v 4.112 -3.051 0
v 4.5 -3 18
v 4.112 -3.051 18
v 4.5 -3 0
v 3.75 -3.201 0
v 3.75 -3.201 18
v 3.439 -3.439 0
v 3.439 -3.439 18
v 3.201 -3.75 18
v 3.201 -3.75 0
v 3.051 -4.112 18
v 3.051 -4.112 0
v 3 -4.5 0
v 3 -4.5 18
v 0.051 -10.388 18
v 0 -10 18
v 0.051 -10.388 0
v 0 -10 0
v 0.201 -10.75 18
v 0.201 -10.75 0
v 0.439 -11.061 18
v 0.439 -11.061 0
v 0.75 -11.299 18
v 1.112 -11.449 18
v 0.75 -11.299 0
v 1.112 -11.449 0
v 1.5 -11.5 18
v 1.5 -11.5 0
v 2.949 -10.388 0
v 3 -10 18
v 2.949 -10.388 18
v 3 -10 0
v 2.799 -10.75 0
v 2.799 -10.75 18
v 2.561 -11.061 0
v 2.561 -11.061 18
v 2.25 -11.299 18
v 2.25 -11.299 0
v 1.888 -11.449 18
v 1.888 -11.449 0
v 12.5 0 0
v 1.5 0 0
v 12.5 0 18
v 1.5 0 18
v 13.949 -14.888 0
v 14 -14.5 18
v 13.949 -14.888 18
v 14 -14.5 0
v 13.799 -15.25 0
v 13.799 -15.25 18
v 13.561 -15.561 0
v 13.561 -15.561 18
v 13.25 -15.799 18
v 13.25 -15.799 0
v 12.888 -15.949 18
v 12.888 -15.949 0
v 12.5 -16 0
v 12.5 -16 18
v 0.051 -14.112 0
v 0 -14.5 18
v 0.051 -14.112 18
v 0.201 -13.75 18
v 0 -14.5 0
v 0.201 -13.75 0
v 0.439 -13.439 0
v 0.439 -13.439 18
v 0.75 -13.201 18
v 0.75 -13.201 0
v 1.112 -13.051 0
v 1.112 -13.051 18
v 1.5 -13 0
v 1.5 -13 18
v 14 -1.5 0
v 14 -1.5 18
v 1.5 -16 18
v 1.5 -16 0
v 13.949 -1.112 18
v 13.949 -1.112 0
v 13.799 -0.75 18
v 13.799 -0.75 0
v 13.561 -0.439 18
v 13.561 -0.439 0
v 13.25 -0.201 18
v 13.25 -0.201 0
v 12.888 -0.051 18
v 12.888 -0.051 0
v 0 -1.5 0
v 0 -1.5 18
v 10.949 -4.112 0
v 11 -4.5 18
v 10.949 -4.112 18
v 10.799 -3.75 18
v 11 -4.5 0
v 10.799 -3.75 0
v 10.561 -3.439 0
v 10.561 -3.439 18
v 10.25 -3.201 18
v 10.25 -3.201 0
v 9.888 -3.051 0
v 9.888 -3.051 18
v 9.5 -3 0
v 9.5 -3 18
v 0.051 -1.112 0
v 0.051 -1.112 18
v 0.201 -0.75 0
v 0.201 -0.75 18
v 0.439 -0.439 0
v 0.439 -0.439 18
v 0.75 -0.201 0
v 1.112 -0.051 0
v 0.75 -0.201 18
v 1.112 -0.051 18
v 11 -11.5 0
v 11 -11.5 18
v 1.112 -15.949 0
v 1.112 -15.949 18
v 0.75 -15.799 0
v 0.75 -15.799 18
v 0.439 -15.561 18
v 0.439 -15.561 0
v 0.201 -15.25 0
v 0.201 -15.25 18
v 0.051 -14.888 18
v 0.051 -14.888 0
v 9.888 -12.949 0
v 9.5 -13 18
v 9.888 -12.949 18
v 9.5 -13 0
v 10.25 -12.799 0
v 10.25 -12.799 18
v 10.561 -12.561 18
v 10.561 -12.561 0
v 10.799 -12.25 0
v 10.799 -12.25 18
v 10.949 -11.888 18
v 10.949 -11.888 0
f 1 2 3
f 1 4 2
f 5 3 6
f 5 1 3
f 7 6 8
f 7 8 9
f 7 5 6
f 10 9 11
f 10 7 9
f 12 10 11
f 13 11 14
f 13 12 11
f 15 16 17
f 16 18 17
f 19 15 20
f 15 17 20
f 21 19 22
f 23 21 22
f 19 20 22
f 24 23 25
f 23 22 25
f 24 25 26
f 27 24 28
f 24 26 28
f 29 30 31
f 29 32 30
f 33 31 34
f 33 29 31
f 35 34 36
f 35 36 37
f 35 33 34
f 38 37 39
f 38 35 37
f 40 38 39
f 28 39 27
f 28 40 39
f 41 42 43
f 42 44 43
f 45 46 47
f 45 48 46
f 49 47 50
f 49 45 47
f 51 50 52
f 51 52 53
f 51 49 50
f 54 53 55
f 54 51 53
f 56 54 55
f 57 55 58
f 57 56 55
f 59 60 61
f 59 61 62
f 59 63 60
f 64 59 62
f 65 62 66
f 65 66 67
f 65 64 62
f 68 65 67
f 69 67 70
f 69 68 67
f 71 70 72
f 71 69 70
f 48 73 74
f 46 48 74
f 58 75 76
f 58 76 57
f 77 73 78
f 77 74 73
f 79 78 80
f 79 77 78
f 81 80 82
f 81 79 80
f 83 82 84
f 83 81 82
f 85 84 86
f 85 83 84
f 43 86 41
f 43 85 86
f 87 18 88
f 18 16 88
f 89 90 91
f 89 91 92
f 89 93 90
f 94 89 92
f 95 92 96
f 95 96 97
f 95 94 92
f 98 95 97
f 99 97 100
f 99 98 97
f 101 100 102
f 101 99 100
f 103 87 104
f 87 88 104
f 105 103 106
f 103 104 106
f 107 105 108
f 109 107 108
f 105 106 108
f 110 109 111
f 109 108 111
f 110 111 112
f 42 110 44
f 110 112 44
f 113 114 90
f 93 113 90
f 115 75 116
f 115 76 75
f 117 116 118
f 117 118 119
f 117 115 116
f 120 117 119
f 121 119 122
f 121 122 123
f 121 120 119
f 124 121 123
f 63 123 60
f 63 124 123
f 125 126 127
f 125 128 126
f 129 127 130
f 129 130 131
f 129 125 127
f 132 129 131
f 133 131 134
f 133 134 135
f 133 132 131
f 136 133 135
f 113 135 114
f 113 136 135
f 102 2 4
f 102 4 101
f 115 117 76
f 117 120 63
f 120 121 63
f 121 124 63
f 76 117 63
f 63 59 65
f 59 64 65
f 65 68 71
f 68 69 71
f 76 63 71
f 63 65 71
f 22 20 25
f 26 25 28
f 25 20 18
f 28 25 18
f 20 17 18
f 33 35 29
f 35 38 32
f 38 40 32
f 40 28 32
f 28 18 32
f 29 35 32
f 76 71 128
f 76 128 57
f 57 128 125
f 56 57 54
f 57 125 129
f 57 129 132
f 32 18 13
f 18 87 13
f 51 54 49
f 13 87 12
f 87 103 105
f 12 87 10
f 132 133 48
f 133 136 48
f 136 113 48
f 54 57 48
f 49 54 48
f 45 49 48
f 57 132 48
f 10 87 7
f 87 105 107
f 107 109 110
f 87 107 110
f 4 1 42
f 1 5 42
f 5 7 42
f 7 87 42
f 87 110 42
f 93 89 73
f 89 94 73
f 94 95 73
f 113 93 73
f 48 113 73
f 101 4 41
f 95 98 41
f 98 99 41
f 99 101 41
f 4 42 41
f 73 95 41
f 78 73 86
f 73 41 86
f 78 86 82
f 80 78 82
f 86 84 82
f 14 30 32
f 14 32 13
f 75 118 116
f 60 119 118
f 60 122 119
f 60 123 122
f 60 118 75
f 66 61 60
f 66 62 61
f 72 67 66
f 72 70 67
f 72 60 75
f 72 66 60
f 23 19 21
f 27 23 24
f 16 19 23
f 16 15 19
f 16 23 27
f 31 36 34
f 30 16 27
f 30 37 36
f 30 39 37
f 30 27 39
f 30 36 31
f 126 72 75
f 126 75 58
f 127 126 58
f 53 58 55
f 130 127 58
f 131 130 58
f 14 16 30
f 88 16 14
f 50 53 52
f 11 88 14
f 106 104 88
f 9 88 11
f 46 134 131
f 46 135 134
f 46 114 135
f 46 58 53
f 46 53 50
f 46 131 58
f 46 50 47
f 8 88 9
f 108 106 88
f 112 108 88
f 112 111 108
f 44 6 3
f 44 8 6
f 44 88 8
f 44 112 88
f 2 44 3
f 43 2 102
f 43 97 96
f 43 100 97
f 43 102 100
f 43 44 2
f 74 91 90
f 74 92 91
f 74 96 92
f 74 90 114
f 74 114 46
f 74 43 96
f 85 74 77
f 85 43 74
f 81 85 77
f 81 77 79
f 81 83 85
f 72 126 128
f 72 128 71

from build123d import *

# Parameters (mm, degrees)
F0_W     = 14
F0_H     = 18
F1_DEPTH = 3
F2_W     = 3
F2_H     = 8.5
F2_H_2   = 10
F3_DEPTH = 18
F4_R     = 1.49999


# Not quite as in the source:
# - a fillet or chamfer is up to 0.001 mm smaller than in the source, because OpenCascade refuses the exact size


with BuildPart() as f1:
    # F0 (on Front) → F1 (new body)
    with BuildSketch(Plane.XZ):
        with Locations((7, 9)):
            Rectangle(F0_W, F0_H)
    extrude(amount=F1_DEPTH)

    # F2 (on face) → F3 (join, through all)
    with BuildSketch(Plane.XY.offset(18)):
        with Locations((1.5, -7.25)):
            Rectangle(F2_W, F2_H)
        Polygon((3, -13), (0, -13), (0, -16), (14, -16), (14, -13), (11, -13), align=None)
        with Locations((12.5, -8)):
            Rectangle(F2_W, F2_H_2)
    extrude(amount=-F3_DEPTH)

    # F4 (radius 1.5 in the source; OpenCascade refuses exactly that, so slightly less here)
    f4_edges = [f1.edges().sort_by_distance(p)[0] for p in [
        (0, -11.5, 9),
        (0, -13, 9),
        (0, -16, 9),
        (3, -11.5, 9),
        (14, -16, 9),
        (14, 0, 9),
        (0, 0, 9),
        (3, -3, 9),
        (11, -3, 9),
        (11, -13, 9),
    ]]
    fillet(f4_edges, radius=F4_R)


solid = f1.part
